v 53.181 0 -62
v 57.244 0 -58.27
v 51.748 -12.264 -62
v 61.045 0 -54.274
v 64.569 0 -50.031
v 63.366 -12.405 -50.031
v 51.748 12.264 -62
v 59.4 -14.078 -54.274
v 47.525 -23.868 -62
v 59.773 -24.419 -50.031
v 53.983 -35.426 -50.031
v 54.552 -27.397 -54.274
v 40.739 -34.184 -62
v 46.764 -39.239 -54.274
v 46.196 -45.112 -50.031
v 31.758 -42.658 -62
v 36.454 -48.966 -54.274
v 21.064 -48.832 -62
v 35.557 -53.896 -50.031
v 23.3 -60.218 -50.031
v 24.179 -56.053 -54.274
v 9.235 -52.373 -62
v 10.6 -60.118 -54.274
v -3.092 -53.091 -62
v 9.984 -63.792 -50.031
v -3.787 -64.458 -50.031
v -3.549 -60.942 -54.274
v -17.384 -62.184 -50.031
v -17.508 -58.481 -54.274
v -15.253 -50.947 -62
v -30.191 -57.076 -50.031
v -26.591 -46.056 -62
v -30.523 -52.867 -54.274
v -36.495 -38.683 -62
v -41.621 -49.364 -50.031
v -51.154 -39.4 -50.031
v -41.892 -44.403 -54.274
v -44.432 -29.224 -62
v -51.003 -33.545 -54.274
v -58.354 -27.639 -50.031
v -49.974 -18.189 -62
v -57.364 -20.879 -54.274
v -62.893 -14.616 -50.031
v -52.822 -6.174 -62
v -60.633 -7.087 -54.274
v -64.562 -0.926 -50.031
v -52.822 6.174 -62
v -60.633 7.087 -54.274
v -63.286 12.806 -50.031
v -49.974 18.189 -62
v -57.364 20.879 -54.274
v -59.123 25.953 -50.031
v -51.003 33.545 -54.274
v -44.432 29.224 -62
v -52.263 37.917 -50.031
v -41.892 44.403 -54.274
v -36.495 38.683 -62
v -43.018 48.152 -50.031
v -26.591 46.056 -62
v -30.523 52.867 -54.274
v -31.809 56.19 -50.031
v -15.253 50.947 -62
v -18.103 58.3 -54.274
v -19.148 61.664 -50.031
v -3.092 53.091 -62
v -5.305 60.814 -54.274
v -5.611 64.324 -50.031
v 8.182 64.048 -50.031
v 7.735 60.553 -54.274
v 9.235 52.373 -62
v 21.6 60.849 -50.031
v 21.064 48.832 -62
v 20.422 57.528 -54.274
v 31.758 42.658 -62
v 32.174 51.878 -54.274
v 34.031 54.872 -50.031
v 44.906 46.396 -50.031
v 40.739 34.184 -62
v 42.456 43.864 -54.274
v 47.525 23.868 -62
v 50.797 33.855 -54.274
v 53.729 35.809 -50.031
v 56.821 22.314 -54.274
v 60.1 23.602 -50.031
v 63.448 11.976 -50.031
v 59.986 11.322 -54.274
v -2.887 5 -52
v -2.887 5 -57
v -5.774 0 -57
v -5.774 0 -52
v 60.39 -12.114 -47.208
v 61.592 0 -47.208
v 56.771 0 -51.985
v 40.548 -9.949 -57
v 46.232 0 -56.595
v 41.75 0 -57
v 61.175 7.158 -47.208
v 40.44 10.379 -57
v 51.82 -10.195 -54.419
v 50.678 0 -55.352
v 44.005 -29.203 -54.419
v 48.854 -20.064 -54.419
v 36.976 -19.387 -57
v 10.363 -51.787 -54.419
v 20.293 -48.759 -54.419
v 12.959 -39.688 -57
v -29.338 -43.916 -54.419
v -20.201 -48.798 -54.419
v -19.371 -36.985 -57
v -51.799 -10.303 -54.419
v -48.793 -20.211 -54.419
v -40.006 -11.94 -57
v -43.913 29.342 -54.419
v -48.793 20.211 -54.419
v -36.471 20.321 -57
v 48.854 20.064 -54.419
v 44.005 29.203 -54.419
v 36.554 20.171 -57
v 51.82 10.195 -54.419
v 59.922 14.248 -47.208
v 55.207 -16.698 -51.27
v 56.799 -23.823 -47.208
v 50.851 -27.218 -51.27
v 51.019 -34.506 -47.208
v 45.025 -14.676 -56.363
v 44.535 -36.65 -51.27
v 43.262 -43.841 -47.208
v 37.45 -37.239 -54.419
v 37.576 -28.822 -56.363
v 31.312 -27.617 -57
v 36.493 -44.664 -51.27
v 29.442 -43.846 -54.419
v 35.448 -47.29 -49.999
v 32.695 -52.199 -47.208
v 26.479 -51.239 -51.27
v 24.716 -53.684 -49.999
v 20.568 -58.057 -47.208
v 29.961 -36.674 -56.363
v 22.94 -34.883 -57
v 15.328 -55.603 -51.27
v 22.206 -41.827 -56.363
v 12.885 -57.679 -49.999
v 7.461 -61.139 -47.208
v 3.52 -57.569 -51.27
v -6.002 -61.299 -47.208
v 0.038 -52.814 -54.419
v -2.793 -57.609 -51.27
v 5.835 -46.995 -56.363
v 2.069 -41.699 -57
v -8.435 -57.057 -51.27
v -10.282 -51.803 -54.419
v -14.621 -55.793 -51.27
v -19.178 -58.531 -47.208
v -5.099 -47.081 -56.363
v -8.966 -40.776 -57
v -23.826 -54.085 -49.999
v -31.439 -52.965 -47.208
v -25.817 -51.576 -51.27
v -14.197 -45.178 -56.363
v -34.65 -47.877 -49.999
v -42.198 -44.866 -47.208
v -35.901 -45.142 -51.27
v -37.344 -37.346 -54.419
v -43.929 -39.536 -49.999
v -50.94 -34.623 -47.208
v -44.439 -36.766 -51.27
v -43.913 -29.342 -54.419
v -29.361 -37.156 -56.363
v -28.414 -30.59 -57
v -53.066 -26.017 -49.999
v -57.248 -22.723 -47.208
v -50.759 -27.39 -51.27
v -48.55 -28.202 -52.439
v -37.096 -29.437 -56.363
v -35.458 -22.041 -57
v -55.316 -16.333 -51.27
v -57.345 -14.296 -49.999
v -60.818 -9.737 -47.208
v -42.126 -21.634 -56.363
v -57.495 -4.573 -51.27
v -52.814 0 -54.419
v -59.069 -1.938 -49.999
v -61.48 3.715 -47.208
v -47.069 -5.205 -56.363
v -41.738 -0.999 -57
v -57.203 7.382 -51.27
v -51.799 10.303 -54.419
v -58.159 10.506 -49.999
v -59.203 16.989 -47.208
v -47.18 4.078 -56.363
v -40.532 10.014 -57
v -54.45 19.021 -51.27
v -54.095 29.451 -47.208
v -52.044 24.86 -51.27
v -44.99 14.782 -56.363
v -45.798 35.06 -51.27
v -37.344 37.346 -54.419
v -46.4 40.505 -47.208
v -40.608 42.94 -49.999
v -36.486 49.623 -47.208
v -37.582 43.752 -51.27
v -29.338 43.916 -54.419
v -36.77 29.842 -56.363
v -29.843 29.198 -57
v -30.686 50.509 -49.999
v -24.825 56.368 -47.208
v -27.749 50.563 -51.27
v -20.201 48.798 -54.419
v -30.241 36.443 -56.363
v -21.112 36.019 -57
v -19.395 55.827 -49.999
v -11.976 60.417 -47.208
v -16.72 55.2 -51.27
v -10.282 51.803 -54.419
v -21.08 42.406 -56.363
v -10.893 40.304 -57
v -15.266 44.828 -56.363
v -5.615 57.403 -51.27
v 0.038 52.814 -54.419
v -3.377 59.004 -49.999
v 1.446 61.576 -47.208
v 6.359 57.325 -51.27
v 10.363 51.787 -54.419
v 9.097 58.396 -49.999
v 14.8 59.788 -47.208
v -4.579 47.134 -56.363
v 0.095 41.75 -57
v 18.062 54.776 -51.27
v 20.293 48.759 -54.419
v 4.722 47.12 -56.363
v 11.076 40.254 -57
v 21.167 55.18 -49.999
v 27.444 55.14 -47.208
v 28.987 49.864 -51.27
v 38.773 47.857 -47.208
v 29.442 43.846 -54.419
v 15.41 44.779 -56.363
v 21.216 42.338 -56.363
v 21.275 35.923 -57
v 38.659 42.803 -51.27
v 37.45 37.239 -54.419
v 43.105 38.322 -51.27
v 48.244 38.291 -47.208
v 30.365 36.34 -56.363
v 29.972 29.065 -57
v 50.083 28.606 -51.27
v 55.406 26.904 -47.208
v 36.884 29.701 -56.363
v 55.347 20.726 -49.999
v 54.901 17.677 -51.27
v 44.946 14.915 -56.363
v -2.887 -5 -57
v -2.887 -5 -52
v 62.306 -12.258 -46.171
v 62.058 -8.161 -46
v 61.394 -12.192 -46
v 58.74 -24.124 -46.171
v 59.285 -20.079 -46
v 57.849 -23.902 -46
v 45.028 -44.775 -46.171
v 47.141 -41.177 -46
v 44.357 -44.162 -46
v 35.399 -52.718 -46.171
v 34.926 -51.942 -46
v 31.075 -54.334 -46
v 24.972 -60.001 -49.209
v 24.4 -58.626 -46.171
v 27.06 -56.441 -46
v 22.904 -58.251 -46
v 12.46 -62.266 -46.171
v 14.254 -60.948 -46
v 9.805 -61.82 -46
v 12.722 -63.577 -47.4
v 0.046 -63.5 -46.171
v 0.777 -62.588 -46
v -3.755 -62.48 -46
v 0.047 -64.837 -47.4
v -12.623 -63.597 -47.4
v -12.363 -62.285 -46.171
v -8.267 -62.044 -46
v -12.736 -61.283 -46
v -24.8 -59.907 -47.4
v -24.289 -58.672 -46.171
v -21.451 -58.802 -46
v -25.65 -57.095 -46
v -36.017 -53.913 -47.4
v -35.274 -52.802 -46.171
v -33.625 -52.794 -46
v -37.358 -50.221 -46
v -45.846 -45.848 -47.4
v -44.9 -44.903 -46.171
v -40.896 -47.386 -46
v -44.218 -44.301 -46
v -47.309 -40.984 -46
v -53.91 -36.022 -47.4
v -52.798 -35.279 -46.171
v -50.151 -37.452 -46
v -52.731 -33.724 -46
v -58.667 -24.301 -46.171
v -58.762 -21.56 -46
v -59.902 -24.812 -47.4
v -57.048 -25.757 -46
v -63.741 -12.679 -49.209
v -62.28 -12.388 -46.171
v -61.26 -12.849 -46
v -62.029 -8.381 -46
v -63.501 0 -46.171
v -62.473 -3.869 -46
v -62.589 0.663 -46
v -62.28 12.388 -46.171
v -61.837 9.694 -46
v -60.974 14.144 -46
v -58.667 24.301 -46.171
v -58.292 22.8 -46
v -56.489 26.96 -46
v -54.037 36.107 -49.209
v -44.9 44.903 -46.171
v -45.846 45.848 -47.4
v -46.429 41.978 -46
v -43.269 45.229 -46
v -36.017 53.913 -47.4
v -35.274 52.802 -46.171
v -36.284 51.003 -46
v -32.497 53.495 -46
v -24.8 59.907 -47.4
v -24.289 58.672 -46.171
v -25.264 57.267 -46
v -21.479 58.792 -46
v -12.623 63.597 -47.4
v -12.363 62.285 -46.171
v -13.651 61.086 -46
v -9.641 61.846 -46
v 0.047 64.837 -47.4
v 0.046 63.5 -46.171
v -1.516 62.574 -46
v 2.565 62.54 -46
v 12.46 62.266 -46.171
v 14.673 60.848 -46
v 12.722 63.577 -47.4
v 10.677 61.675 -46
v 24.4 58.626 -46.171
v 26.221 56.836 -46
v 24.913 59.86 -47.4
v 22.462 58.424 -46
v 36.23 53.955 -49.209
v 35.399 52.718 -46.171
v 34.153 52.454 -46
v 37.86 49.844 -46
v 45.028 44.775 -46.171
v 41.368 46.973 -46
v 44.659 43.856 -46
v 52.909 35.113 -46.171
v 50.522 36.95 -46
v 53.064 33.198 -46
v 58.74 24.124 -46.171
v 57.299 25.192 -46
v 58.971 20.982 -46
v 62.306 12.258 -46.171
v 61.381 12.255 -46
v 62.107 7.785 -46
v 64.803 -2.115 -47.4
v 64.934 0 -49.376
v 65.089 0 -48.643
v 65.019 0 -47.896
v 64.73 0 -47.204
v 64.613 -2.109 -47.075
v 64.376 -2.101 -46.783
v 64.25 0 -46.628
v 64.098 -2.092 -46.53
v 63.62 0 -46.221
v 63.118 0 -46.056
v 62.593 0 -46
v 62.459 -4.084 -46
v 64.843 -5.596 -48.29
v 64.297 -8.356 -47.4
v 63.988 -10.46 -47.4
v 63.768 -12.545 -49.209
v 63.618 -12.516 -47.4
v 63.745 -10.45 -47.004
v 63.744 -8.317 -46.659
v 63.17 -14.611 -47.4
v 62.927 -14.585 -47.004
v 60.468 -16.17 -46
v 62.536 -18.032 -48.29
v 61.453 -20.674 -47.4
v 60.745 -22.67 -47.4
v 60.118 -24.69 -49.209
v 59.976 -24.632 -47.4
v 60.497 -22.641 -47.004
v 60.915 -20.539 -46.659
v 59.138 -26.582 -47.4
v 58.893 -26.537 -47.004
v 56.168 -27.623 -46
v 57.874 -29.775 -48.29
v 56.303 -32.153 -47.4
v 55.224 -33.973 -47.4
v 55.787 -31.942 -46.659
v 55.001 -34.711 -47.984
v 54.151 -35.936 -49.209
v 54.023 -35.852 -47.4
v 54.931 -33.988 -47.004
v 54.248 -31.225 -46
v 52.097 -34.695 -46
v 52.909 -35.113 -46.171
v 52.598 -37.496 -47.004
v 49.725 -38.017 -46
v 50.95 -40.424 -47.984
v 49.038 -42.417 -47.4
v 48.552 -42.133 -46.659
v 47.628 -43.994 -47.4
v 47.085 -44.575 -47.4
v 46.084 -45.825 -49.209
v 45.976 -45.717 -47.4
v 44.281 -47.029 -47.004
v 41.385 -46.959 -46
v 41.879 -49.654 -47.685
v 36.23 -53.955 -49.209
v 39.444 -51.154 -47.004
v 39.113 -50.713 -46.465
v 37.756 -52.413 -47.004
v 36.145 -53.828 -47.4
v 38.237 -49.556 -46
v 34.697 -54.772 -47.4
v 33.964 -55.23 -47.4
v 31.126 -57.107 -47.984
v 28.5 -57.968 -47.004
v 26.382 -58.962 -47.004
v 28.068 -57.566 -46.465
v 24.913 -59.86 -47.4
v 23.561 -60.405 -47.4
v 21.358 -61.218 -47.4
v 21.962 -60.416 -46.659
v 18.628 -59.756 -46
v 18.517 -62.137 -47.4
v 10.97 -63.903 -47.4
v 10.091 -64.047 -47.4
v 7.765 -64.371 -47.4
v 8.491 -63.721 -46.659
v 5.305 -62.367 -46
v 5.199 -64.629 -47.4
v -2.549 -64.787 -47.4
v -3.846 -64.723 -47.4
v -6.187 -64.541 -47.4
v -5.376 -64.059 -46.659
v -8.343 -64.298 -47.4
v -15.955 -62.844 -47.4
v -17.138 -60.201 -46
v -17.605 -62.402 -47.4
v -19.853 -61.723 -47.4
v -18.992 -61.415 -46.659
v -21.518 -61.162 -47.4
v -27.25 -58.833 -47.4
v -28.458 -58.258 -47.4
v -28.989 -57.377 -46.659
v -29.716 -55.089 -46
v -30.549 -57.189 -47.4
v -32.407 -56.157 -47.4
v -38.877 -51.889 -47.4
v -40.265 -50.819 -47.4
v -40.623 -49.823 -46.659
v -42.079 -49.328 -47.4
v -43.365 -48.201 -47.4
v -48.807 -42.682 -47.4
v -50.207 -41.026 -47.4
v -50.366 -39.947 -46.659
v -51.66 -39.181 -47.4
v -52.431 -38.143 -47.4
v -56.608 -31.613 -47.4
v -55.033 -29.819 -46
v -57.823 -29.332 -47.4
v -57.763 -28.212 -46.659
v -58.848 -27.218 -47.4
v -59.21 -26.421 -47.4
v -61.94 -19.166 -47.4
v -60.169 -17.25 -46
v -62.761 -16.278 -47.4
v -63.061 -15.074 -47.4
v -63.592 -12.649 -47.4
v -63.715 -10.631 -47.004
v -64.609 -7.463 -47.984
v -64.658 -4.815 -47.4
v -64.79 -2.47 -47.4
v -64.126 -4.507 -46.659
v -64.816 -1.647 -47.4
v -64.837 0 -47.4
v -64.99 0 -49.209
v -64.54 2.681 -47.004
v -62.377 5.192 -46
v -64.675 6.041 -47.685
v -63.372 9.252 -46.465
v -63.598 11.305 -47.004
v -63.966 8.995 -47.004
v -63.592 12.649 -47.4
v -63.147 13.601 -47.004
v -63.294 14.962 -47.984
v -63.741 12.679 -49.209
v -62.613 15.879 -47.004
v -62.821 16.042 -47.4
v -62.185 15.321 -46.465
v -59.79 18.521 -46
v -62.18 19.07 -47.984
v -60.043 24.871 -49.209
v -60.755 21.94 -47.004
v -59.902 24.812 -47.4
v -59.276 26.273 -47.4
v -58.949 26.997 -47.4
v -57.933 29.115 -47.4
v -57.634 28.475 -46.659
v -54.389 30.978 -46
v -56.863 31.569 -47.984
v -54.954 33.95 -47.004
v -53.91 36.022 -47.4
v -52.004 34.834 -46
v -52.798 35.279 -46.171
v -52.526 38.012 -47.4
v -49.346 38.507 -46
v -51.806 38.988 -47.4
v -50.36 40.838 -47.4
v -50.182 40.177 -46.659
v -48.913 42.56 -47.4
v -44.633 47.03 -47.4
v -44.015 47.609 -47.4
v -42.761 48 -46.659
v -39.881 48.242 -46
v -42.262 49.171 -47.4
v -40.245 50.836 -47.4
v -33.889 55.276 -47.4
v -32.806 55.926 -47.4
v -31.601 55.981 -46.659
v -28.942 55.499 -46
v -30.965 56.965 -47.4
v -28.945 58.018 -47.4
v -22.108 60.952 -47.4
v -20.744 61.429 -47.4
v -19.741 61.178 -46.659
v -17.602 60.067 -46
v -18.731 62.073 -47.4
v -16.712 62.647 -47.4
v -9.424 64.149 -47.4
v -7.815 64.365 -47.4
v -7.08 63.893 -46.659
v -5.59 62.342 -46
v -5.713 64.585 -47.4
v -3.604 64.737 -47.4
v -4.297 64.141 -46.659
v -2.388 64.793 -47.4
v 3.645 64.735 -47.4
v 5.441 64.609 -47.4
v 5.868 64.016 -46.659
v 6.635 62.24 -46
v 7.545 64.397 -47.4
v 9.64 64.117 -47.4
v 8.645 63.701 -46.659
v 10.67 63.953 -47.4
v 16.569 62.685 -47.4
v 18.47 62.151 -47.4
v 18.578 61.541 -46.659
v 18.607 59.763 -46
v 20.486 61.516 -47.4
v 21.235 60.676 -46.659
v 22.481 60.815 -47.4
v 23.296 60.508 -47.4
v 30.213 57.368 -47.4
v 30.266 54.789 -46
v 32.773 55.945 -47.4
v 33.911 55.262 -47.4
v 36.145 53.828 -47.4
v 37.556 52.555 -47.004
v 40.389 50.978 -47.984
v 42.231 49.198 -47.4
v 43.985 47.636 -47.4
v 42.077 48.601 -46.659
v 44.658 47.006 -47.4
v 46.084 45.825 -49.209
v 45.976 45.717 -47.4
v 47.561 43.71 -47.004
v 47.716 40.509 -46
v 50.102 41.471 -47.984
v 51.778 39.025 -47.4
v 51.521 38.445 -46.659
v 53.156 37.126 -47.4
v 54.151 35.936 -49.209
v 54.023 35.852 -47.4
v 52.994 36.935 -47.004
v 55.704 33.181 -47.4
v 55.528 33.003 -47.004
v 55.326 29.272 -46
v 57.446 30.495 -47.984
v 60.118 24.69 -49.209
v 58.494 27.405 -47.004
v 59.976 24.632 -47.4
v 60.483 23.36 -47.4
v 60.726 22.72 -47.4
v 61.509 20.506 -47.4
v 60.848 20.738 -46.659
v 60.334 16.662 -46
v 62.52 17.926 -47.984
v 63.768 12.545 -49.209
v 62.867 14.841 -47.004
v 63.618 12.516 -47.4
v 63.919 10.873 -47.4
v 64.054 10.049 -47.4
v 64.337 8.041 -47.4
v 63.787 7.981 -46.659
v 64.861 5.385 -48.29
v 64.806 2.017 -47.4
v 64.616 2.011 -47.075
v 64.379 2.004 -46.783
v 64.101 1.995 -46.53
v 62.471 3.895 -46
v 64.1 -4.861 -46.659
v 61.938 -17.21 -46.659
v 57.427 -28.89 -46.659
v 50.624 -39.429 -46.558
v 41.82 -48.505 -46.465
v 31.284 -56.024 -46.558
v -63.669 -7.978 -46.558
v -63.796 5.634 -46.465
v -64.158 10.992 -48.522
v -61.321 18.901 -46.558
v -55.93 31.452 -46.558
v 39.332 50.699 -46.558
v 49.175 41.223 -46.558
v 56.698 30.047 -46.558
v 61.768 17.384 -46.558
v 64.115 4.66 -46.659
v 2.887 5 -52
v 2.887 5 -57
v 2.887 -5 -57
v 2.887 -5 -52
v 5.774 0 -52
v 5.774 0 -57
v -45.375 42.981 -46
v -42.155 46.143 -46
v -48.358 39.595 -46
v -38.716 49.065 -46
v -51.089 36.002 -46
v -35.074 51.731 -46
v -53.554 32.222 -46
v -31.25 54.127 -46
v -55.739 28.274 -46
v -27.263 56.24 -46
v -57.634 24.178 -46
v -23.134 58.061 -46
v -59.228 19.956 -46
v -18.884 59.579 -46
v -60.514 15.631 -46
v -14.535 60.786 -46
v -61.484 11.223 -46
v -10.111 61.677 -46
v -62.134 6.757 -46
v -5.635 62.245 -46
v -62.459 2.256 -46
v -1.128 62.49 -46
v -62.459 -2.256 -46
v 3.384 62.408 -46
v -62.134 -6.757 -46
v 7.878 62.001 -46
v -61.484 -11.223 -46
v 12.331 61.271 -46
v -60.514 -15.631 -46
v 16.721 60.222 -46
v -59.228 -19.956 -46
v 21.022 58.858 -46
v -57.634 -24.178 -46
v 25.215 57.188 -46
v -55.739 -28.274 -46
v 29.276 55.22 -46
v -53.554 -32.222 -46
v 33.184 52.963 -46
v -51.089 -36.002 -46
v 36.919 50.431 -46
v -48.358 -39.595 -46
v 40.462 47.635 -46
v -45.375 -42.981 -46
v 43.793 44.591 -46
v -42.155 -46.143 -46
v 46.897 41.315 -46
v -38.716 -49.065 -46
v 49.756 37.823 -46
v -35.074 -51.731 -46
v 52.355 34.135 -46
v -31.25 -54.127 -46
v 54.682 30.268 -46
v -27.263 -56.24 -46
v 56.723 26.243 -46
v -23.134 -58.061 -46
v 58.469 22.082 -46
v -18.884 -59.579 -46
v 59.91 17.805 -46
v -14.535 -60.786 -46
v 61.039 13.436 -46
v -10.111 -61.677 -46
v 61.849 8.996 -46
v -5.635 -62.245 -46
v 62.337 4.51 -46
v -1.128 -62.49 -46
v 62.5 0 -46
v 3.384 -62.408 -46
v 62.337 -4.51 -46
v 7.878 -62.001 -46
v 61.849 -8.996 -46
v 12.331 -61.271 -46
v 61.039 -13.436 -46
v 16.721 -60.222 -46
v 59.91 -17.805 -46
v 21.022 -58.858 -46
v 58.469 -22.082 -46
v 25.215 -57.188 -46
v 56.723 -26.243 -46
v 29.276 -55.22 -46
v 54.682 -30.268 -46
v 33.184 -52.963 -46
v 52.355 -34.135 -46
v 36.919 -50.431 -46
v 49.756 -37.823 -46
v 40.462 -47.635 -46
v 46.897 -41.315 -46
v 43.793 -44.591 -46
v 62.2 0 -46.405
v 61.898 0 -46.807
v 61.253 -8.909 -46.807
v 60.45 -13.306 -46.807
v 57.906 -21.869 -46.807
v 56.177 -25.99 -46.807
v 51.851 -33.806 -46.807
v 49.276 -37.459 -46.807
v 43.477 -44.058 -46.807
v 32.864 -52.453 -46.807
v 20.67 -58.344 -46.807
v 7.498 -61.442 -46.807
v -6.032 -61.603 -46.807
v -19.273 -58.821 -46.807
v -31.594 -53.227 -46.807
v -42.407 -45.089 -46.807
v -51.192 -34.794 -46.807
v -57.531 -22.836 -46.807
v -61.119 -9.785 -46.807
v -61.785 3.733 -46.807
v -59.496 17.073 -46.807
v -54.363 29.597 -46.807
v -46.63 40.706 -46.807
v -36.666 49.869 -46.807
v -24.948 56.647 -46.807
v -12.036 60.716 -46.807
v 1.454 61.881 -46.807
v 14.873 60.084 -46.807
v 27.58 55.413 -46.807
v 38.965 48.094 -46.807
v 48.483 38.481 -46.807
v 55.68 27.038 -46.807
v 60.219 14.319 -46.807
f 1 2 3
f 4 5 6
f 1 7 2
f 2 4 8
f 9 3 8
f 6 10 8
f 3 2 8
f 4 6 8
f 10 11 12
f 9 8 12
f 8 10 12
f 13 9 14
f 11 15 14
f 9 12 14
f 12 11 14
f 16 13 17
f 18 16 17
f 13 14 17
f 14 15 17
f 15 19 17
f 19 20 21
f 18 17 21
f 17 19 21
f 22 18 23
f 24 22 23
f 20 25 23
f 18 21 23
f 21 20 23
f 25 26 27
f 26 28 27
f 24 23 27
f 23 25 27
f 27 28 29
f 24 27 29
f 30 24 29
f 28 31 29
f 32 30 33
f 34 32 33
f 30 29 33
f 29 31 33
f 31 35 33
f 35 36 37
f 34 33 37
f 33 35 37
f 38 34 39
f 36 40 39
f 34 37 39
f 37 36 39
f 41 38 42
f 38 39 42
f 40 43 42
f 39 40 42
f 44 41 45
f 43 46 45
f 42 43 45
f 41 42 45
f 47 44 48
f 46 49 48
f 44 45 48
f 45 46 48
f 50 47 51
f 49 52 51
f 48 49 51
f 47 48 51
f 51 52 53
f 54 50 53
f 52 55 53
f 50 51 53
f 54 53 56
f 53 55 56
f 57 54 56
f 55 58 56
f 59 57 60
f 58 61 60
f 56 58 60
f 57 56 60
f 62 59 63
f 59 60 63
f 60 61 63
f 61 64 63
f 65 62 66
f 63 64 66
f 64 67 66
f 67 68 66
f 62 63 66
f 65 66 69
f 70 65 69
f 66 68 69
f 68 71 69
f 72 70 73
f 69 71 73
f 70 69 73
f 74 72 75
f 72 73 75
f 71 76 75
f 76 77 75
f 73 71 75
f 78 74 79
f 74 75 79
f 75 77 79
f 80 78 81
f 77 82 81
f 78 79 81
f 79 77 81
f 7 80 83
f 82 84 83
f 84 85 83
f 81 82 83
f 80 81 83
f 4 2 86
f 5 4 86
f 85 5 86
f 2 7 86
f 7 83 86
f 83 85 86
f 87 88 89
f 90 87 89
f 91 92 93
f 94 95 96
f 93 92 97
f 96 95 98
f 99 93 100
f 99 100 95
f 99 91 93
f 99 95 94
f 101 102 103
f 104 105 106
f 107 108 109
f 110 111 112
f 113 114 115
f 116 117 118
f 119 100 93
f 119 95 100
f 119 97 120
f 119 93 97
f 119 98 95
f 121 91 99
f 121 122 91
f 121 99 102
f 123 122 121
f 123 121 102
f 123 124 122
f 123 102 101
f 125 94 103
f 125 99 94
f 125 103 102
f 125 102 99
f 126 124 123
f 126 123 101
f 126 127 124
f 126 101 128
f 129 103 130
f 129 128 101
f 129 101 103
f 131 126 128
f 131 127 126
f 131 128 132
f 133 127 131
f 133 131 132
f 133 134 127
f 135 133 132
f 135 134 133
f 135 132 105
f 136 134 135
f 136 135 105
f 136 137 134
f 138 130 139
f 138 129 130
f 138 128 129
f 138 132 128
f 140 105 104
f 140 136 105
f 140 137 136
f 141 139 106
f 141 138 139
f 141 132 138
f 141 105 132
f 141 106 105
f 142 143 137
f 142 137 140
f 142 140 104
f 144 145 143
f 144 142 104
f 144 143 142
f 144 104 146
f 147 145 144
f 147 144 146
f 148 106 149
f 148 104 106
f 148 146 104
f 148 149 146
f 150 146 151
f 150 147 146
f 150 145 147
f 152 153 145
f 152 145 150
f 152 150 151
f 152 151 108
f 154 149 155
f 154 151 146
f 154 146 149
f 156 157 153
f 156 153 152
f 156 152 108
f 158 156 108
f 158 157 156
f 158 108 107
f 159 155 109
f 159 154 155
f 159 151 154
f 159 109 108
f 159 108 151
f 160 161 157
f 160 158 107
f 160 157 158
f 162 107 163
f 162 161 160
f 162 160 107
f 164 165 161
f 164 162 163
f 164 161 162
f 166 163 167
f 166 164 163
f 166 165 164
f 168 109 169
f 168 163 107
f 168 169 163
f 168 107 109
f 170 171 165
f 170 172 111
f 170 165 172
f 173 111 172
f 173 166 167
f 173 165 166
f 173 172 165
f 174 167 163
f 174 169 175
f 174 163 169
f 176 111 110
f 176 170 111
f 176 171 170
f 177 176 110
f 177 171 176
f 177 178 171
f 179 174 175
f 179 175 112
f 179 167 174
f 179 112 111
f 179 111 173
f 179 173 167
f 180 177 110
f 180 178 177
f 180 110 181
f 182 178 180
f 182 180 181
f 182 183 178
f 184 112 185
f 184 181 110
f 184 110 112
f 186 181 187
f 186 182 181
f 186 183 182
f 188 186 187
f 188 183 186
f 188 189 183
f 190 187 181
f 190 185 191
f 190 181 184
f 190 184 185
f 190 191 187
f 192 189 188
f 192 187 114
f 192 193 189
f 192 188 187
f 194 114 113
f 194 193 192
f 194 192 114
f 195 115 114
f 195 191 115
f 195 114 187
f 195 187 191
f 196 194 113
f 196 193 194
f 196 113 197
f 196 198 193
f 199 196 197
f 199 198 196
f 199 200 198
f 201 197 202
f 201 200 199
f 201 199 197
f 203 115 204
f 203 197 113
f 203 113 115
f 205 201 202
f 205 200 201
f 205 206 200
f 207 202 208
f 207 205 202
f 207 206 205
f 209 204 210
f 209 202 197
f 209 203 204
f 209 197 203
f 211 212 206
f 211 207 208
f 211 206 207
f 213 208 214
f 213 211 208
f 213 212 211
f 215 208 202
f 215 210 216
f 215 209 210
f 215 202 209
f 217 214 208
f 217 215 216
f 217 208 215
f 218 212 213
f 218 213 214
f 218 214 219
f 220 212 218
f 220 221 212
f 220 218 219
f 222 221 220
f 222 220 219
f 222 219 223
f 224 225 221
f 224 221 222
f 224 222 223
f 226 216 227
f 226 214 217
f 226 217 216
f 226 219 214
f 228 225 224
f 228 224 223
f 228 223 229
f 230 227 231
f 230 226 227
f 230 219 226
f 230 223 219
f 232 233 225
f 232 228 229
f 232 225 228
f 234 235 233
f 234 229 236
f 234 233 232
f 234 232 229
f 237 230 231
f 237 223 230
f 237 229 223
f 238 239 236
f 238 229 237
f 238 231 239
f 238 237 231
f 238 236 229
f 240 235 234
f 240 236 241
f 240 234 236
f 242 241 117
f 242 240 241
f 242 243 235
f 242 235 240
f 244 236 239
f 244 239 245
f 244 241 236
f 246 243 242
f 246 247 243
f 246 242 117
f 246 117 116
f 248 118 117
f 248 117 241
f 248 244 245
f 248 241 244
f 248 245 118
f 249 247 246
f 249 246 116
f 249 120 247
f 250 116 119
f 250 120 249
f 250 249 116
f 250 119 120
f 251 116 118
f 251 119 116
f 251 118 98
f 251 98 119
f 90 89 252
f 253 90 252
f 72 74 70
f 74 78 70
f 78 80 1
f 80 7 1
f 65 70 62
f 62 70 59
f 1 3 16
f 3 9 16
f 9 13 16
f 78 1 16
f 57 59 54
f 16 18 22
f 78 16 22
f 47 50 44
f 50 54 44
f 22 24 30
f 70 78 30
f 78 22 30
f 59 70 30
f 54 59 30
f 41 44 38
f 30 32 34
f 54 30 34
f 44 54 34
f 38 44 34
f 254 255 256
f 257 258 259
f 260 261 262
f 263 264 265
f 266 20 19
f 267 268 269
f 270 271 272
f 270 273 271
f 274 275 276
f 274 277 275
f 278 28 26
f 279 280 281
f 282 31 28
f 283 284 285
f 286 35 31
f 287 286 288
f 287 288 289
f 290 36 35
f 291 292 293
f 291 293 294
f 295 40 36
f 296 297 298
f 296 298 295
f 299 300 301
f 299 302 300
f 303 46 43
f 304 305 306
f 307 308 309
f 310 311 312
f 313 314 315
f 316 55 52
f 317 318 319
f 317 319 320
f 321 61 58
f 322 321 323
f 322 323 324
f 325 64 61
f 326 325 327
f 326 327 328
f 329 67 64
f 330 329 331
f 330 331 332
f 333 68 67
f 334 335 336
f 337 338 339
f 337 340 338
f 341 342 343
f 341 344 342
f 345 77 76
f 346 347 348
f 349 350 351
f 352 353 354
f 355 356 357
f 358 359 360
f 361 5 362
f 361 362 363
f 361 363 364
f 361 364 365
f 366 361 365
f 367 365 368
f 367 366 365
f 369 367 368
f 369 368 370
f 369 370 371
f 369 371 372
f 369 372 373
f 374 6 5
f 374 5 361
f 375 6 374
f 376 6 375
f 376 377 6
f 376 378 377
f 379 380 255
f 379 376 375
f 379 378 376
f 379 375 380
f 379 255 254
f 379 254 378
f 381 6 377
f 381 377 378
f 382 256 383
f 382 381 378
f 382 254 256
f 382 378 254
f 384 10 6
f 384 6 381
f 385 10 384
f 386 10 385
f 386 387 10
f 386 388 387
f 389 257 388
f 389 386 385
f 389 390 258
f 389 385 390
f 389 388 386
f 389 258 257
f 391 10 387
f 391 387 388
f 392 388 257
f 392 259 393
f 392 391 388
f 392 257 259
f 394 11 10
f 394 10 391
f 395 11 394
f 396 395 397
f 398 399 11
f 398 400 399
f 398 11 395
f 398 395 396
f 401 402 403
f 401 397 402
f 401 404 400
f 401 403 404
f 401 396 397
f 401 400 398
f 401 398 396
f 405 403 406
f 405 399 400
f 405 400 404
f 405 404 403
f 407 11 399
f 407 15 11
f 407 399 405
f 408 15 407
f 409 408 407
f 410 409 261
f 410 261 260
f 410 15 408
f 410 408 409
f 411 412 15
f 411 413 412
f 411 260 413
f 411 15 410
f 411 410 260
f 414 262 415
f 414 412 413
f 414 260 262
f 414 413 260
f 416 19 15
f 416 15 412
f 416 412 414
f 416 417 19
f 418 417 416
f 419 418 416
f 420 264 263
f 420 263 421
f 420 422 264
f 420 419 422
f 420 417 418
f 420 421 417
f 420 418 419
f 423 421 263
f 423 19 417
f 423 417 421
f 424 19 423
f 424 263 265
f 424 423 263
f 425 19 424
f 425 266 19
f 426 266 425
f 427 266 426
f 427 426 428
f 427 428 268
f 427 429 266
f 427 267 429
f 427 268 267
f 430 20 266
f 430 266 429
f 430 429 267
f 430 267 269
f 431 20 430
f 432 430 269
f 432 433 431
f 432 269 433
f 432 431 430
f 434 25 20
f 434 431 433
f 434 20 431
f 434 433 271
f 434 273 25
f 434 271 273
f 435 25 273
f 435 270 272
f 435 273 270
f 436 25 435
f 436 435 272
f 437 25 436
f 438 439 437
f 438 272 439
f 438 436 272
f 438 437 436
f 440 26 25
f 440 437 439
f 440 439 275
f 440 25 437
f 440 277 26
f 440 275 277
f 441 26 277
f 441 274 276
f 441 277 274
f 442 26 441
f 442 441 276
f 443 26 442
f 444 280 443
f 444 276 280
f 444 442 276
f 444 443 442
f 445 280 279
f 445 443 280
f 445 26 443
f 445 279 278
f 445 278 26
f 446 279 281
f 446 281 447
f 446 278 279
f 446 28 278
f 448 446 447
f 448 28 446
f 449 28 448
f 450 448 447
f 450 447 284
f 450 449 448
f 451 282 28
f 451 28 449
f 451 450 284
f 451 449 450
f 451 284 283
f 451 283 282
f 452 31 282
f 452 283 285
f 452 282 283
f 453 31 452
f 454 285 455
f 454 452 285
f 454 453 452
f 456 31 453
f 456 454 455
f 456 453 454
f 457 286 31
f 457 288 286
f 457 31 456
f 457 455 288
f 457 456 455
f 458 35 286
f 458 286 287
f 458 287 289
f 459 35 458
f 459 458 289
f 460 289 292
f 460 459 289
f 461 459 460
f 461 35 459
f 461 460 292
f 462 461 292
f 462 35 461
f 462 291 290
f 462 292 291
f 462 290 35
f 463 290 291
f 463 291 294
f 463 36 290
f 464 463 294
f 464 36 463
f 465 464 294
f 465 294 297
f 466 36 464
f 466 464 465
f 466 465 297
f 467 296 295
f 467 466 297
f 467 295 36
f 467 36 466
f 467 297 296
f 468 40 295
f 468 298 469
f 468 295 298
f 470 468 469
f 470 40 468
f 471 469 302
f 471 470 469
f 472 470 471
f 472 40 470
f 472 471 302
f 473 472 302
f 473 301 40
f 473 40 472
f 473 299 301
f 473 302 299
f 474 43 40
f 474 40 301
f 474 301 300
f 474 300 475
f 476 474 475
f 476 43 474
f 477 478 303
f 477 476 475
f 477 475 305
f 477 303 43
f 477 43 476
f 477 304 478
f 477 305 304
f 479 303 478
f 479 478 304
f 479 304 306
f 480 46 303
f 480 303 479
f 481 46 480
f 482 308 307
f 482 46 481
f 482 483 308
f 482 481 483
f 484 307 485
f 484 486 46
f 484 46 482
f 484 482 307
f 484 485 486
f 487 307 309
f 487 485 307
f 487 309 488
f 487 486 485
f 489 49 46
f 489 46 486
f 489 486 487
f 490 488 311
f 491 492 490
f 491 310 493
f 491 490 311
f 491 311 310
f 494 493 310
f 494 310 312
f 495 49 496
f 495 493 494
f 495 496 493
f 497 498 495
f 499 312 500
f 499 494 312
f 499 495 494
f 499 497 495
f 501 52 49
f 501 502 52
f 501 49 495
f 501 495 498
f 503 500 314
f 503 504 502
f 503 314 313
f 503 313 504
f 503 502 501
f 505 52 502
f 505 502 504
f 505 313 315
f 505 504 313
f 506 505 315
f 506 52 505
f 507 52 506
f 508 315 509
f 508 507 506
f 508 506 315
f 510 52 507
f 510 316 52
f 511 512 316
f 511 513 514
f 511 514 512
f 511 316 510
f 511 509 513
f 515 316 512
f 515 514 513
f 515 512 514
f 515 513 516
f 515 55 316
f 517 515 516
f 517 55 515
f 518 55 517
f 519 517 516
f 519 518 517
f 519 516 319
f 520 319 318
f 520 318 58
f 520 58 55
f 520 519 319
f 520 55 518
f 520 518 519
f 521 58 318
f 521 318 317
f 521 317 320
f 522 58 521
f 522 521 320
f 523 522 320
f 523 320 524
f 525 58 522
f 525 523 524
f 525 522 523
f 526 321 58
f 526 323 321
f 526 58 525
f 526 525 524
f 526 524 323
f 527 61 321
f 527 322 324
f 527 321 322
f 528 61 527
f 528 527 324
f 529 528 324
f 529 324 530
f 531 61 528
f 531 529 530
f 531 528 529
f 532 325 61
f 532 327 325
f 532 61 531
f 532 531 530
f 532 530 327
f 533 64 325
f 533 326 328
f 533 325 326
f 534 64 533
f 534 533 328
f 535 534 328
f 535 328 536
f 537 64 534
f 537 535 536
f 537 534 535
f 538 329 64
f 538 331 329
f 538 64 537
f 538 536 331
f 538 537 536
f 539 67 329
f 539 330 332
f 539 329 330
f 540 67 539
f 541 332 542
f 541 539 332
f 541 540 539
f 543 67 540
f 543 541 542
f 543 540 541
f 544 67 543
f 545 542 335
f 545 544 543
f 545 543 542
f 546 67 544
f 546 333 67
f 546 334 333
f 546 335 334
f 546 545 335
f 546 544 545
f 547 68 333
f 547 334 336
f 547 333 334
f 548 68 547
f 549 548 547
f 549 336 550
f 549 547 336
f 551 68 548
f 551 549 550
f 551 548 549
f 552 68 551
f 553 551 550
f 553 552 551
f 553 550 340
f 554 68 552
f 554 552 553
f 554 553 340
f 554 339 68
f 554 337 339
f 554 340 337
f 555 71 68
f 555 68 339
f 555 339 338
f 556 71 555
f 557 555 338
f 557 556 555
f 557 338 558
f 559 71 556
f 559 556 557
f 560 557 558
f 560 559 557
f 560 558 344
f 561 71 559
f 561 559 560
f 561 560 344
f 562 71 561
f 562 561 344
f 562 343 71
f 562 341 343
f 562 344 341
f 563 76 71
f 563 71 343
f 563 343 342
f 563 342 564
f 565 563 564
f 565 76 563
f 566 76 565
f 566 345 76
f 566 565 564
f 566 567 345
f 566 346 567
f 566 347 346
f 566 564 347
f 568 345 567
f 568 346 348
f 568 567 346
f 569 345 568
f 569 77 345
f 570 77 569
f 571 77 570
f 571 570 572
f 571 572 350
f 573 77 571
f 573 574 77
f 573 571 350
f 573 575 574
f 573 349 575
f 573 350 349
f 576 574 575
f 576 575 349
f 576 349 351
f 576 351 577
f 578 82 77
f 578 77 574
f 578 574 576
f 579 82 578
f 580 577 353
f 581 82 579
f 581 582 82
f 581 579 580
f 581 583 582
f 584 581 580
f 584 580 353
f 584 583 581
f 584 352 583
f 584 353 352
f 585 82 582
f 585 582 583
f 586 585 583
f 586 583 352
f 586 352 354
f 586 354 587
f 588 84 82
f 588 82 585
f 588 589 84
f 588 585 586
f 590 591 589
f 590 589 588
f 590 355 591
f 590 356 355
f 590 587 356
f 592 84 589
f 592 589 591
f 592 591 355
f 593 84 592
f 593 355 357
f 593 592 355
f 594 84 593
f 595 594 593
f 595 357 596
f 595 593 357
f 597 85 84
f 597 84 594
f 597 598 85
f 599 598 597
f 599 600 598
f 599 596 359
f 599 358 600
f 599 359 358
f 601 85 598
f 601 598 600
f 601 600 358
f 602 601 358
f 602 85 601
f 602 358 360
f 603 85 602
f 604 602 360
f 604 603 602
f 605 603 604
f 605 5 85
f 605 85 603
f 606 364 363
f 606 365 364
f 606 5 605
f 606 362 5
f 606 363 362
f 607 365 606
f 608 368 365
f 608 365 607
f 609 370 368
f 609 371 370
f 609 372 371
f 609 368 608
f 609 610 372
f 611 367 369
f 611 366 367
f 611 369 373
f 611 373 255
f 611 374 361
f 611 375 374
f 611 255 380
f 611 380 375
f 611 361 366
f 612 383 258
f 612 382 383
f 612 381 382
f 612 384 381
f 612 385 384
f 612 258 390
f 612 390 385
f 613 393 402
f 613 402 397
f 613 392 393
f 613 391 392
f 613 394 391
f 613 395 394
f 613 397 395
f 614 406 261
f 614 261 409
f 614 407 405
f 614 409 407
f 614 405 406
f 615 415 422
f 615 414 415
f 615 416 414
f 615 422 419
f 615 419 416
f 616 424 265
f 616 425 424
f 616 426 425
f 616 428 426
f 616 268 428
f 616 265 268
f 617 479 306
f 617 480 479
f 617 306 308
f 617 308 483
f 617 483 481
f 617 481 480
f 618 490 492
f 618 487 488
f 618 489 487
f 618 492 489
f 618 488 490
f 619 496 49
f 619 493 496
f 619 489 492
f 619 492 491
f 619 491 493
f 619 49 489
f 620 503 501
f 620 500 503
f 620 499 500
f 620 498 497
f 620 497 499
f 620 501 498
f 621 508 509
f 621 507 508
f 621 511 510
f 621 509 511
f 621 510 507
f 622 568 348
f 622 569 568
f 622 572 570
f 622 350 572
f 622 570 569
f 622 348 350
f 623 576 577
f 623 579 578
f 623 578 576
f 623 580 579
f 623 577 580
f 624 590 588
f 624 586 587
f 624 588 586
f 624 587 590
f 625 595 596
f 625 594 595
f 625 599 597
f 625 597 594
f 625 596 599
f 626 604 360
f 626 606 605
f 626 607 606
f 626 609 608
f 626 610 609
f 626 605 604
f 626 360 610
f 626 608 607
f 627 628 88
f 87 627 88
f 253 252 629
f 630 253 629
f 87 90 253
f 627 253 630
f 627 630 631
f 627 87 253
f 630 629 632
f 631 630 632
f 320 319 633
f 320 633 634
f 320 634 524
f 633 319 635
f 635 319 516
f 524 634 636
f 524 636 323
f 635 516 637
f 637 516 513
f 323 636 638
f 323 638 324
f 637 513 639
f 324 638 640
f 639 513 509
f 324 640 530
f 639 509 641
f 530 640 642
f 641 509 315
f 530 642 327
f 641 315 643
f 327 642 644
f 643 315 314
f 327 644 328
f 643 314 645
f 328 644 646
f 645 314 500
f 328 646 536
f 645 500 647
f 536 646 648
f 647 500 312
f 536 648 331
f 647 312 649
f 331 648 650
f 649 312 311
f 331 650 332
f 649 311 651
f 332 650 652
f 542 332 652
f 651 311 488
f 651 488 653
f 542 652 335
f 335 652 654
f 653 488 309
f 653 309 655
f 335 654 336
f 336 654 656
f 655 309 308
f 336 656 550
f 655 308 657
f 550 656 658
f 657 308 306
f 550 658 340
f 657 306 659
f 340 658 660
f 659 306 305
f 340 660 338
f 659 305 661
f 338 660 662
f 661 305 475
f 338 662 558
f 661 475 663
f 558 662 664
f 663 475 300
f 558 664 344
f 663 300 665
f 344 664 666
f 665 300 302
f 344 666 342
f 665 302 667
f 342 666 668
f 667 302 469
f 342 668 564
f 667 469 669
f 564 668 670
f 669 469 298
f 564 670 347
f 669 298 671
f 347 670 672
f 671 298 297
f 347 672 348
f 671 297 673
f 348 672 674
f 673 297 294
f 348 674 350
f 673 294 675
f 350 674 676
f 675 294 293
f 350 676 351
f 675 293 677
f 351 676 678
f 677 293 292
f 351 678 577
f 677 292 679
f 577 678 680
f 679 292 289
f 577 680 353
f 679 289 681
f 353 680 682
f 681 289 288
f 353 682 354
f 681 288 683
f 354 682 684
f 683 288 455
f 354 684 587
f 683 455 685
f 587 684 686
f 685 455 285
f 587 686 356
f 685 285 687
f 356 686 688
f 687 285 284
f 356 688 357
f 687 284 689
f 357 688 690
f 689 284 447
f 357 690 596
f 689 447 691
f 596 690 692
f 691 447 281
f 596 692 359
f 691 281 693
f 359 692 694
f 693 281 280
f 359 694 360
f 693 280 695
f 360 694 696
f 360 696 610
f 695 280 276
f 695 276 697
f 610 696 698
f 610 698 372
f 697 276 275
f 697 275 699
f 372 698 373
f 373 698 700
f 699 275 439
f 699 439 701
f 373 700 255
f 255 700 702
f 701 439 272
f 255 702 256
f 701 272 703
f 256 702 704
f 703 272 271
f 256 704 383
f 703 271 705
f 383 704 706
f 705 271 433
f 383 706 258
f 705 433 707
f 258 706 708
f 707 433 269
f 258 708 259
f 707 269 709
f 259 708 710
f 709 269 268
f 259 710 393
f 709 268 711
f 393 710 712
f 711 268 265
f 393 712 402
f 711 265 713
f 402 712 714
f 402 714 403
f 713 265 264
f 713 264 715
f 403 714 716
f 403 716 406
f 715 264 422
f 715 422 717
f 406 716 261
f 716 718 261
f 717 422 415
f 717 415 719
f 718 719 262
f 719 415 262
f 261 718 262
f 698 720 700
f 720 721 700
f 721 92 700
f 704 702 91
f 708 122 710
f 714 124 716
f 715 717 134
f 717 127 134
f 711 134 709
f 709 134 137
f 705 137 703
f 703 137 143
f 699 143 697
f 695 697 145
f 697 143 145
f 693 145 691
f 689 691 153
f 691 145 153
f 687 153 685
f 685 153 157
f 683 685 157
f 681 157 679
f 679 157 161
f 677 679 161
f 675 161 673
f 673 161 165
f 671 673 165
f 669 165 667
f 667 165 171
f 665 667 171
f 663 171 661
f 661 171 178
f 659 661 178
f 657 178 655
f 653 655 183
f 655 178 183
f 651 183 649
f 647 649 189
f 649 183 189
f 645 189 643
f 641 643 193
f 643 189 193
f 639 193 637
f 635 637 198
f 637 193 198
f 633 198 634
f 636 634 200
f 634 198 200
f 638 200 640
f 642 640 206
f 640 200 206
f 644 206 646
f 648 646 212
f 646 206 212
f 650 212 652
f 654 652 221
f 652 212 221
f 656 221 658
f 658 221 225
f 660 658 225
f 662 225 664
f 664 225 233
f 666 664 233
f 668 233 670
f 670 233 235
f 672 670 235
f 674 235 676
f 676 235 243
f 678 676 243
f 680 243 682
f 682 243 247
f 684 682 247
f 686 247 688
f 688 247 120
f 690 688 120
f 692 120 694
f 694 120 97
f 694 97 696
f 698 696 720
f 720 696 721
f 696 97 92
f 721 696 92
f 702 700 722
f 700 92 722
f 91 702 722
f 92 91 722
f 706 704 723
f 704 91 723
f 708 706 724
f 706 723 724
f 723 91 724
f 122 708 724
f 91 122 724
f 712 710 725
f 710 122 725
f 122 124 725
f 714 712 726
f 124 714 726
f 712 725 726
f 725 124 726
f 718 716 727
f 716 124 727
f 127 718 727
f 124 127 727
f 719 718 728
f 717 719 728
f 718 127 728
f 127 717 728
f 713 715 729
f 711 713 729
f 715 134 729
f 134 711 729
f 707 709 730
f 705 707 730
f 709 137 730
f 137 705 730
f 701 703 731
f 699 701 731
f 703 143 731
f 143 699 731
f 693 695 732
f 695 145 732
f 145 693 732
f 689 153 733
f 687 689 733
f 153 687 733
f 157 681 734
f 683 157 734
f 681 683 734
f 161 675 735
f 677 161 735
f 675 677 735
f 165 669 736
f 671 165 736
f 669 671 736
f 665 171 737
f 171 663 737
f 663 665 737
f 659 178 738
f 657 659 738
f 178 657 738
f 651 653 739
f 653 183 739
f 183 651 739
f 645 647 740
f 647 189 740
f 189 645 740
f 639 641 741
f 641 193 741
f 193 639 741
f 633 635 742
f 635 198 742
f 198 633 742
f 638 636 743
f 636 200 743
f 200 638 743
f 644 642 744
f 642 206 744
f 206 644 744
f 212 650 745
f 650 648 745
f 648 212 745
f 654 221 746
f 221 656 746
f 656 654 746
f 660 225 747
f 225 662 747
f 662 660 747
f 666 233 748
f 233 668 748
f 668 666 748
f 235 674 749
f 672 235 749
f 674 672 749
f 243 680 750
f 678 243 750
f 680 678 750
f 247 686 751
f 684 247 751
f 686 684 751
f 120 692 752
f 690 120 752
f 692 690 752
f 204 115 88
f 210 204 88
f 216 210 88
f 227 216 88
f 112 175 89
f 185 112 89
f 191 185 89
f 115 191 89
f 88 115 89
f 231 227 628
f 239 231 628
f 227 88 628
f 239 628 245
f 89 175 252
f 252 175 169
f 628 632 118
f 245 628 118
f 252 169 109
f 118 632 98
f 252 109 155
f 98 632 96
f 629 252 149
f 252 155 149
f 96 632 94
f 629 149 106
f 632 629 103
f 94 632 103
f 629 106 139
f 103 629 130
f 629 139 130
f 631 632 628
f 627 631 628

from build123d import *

# Parameters (mm, degrees)
F4_DEPTH = 5
F5_R     = 2.5
F6_R     = 25


with BuildPart() as f2:
    # F0 (on Front) → F2 (revolve)
    with BuildSketch(Plane.XZ):
        with BuildLine():
            Line((0, -62), (53.181294, -62))
            ThreePointArc((53.181294, -62), (60.868659, -54.472528), (67.5, -46))
            Line((67.5, -46), (62.5, -46))
            ThreePointArc((62.5, -46), (57.842906, -51.734401), (52.661656, -57))
            Line((52.661656, -57), (0, -57))
            Line((0, -57), (0, -62))
        make_face()
    revolve(axis=Axis((0, 0, -4.725926), (0, 0, -1)))

    # F3 (on face) → F4 (join)
    with BuildSketch(Plane.XY.offset(-57)):
        Polygon((-2.886751, -5), (2.886751, -5), (5.773503, 0), (2.886751, 5), (-2.886751, 5), (-5.773503, 0), align=None)
    extrude(amount=F4_DEPTH)

    # F5
    f5_edges = [f2.edges().sort_by_distance(p)[0] for p in [
        (-67.5, 0, -46),
    ]]
    fillet(f5_edges, radius=F5_R)

    # F6
    f6_edges = [f2.edges().sort_by_distance(p)[0] for p in [
        (-52.661656, 0, -57),
    ]]
    fillet(f6_edges, radius=F6_R)


solid = f2.part
